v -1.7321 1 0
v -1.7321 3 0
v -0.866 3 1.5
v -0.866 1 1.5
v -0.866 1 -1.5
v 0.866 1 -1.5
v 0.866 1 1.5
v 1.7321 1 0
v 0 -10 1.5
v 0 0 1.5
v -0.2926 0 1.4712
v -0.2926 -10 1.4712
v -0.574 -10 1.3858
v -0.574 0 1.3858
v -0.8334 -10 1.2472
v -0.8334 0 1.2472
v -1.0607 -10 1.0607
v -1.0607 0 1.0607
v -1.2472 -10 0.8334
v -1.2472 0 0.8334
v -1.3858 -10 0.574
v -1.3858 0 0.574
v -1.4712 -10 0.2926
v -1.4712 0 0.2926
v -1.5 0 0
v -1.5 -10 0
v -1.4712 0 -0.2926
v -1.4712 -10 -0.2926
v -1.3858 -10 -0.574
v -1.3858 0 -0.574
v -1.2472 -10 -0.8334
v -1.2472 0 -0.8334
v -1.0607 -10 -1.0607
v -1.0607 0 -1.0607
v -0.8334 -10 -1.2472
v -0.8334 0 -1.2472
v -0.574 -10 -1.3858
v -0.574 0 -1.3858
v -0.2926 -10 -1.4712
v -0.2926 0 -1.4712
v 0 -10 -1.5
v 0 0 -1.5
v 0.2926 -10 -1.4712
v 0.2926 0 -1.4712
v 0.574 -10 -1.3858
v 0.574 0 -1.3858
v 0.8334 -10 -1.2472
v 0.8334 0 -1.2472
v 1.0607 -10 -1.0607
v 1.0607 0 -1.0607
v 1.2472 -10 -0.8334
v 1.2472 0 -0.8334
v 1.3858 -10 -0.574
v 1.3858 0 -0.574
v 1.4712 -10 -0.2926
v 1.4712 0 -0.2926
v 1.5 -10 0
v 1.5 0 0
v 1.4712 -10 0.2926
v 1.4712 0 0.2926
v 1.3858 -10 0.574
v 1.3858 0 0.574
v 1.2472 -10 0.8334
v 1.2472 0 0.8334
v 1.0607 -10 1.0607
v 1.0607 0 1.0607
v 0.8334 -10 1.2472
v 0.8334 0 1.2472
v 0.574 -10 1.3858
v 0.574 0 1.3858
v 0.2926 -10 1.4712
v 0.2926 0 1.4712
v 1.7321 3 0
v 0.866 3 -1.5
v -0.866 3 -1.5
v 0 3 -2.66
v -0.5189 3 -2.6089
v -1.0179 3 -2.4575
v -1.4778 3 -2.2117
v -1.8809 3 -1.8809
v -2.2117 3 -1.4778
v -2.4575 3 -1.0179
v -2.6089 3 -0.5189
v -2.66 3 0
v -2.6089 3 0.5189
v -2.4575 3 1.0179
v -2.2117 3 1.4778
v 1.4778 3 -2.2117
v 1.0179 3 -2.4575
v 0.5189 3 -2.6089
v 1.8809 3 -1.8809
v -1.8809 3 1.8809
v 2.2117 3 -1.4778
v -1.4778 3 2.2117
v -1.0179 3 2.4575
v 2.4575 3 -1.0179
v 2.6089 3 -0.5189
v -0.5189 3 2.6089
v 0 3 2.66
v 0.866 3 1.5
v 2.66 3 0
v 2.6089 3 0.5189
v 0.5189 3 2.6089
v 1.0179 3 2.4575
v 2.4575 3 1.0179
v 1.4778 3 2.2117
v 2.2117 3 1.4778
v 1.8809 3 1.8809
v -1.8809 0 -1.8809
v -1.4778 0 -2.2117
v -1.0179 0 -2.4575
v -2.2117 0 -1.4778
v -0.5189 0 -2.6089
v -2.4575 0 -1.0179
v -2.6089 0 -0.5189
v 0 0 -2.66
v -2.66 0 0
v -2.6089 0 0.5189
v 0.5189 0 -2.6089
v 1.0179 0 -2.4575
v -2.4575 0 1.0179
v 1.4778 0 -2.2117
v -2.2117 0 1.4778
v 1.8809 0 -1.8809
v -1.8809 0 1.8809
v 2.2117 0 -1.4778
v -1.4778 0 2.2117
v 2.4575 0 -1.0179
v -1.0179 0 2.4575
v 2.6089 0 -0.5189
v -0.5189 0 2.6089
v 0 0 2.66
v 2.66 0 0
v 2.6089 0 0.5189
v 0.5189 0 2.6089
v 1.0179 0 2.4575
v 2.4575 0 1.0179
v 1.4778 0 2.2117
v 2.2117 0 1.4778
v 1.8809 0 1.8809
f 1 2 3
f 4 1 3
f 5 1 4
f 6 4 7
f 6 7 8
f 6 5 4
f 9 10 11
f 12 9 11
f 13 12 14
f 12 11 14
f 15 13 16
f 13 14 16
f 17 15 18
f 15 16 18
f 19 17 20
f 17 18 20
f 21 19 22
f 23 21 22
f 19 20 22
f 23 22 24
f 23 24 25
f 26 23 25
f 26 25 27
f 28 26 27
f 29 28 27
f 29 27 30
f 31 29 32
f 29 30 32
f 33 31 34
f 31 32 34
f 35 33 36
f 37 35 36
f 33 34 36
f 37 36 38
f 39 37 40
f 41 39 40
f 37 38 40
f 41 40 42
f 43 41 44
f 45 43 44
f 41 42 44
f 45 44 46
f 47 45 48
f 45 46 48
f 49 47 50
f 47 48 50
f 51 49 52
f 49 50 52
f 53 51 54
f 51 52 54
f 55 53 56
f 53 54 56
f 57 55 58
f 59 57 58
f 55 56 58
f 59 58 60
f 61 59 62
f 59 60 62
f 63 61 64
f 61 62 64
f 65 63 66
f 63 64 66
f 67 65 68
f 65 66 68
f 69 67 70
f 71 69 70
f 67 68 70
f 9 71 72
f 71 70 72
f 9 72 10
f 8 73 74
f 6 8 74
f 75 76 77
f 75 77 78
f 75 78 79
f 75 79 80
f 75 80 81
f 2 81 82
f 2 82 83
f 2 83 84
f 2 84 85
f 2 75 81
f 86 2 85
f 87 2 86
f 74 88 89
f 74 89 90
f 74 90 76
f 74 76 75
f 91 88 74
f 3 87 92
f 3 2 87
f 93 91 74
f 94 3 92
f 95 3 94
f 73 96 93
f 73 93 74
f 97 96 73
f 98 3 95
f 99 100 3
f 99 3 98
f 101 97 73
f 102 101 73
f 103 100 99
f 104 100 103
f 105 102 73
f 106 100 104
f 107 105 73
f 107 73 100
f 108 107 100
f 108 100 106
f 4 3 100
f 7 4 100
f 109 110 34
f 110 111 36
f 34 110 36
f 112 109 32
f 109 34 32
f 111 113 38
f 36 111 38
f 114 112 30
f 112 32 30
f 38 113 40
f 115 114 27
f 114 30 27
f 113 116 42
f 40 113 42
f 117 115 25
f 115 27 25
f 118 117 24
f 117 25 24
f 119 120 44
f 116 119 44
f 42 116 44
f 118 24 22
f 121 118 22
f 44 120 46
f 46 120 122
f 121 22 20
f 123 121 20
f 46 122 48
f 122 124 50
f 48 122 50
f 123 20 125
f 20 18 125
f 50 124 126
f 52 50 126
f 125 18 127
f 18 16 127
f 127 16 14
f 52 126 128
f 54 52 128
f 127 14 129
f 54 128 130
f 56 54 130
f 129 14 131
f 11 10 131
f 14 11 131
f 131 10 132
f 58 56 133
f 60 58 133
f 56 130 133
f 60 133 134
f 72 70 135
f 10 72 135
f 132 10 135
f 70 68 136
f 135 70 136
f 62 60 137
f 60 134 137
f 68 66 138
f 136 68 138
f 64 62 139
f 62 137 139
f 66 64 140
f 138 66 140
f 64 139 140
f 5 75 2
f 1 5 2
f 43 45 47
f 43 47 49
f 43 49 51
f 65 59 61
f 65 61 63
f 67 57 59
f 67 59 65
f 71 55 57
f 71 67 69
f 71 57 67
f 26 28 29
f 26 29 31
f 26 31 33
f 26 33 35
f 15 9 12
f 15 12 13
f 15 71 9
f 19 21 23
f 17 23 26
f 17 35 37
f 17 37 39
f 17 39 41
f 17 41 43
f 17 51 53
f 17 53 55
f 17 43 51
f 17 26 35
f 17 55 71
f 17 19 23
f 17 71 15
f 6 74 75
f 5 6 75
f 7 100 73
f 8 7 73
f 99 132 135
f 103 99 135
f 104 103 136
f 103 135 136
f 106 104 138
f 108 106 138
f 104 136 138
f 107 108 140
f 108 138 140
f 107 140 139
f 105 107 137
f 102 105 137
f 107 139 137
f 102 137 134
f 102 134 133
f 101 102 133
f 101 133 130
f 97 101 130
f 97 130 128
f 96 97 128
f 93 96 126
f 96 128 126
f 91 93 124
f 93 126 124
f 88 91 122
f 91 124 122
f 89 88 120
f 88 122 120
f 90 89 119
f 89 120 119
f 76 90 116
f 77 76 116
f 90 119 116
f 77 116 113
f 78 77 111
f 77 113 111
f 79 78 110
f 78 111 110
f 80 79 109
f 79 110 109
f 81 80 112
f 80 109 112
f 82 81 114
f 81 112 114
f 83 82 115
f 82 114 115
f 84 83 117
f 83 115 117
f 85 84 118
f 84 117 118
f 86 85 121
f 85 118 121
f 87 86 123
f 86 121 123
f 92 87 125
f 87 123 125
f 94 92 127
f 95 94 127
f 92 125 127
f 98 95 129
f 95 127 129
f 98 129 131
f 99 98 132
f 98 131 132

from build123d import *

# Parameters (mm, degrees)
SKETCH1_R           = 2.66
BOSS_EXTRUDE1_DEPTH = 3
CUT_EXTRUDE1_DEPTH  = 2
SKETCH3_R           = 1.5
BOSS_EXTRUDE2_DEPTH = 10


with BuildPart() as part:
    # Sketch1 → Boss-Extrude1 (new body)
    with BuildSketch(Plane(origin=(0, 0, 0), x_dir=(1, 0, 0), z_dir=(0, 1, 0))):
        with Locations(Location((0, 0, 0), (0, 0, 270))):
            Circle(SKETCH1_R)
    extrude(amount=BOSS_EXTRUDE1_DEPTH)

    # Sketch2 → Cut-Extrude1 (cut)
    with BuildSketch(Plane(origin=(0, 3, 0), x_dir=(1, 0, 0), z_dir=(0, 1, 0))):
        Polygon((1.732050808, 0), (0.866025404, 1.5), (-0.866025404, 1.5), (-1.732050808, 0), (-0.866025404, -1.5), (0.866025404, -1.5), align=None)
    extrude(amount=-CUT_EXTRUDE1_DEPTH, mode=Mode.SUBTRACT)

    # Sketch3 → Boss-Extrude2 (add)
    with BuildSketch(Plane.XZ):
        with Locations(Location((0, 0, 0), (0, 0, 90))):
            Circle(SKETCH3_R)
    extrude(amount=BOSS_EXTRUDE2_DEPTH)


solid = part.part
